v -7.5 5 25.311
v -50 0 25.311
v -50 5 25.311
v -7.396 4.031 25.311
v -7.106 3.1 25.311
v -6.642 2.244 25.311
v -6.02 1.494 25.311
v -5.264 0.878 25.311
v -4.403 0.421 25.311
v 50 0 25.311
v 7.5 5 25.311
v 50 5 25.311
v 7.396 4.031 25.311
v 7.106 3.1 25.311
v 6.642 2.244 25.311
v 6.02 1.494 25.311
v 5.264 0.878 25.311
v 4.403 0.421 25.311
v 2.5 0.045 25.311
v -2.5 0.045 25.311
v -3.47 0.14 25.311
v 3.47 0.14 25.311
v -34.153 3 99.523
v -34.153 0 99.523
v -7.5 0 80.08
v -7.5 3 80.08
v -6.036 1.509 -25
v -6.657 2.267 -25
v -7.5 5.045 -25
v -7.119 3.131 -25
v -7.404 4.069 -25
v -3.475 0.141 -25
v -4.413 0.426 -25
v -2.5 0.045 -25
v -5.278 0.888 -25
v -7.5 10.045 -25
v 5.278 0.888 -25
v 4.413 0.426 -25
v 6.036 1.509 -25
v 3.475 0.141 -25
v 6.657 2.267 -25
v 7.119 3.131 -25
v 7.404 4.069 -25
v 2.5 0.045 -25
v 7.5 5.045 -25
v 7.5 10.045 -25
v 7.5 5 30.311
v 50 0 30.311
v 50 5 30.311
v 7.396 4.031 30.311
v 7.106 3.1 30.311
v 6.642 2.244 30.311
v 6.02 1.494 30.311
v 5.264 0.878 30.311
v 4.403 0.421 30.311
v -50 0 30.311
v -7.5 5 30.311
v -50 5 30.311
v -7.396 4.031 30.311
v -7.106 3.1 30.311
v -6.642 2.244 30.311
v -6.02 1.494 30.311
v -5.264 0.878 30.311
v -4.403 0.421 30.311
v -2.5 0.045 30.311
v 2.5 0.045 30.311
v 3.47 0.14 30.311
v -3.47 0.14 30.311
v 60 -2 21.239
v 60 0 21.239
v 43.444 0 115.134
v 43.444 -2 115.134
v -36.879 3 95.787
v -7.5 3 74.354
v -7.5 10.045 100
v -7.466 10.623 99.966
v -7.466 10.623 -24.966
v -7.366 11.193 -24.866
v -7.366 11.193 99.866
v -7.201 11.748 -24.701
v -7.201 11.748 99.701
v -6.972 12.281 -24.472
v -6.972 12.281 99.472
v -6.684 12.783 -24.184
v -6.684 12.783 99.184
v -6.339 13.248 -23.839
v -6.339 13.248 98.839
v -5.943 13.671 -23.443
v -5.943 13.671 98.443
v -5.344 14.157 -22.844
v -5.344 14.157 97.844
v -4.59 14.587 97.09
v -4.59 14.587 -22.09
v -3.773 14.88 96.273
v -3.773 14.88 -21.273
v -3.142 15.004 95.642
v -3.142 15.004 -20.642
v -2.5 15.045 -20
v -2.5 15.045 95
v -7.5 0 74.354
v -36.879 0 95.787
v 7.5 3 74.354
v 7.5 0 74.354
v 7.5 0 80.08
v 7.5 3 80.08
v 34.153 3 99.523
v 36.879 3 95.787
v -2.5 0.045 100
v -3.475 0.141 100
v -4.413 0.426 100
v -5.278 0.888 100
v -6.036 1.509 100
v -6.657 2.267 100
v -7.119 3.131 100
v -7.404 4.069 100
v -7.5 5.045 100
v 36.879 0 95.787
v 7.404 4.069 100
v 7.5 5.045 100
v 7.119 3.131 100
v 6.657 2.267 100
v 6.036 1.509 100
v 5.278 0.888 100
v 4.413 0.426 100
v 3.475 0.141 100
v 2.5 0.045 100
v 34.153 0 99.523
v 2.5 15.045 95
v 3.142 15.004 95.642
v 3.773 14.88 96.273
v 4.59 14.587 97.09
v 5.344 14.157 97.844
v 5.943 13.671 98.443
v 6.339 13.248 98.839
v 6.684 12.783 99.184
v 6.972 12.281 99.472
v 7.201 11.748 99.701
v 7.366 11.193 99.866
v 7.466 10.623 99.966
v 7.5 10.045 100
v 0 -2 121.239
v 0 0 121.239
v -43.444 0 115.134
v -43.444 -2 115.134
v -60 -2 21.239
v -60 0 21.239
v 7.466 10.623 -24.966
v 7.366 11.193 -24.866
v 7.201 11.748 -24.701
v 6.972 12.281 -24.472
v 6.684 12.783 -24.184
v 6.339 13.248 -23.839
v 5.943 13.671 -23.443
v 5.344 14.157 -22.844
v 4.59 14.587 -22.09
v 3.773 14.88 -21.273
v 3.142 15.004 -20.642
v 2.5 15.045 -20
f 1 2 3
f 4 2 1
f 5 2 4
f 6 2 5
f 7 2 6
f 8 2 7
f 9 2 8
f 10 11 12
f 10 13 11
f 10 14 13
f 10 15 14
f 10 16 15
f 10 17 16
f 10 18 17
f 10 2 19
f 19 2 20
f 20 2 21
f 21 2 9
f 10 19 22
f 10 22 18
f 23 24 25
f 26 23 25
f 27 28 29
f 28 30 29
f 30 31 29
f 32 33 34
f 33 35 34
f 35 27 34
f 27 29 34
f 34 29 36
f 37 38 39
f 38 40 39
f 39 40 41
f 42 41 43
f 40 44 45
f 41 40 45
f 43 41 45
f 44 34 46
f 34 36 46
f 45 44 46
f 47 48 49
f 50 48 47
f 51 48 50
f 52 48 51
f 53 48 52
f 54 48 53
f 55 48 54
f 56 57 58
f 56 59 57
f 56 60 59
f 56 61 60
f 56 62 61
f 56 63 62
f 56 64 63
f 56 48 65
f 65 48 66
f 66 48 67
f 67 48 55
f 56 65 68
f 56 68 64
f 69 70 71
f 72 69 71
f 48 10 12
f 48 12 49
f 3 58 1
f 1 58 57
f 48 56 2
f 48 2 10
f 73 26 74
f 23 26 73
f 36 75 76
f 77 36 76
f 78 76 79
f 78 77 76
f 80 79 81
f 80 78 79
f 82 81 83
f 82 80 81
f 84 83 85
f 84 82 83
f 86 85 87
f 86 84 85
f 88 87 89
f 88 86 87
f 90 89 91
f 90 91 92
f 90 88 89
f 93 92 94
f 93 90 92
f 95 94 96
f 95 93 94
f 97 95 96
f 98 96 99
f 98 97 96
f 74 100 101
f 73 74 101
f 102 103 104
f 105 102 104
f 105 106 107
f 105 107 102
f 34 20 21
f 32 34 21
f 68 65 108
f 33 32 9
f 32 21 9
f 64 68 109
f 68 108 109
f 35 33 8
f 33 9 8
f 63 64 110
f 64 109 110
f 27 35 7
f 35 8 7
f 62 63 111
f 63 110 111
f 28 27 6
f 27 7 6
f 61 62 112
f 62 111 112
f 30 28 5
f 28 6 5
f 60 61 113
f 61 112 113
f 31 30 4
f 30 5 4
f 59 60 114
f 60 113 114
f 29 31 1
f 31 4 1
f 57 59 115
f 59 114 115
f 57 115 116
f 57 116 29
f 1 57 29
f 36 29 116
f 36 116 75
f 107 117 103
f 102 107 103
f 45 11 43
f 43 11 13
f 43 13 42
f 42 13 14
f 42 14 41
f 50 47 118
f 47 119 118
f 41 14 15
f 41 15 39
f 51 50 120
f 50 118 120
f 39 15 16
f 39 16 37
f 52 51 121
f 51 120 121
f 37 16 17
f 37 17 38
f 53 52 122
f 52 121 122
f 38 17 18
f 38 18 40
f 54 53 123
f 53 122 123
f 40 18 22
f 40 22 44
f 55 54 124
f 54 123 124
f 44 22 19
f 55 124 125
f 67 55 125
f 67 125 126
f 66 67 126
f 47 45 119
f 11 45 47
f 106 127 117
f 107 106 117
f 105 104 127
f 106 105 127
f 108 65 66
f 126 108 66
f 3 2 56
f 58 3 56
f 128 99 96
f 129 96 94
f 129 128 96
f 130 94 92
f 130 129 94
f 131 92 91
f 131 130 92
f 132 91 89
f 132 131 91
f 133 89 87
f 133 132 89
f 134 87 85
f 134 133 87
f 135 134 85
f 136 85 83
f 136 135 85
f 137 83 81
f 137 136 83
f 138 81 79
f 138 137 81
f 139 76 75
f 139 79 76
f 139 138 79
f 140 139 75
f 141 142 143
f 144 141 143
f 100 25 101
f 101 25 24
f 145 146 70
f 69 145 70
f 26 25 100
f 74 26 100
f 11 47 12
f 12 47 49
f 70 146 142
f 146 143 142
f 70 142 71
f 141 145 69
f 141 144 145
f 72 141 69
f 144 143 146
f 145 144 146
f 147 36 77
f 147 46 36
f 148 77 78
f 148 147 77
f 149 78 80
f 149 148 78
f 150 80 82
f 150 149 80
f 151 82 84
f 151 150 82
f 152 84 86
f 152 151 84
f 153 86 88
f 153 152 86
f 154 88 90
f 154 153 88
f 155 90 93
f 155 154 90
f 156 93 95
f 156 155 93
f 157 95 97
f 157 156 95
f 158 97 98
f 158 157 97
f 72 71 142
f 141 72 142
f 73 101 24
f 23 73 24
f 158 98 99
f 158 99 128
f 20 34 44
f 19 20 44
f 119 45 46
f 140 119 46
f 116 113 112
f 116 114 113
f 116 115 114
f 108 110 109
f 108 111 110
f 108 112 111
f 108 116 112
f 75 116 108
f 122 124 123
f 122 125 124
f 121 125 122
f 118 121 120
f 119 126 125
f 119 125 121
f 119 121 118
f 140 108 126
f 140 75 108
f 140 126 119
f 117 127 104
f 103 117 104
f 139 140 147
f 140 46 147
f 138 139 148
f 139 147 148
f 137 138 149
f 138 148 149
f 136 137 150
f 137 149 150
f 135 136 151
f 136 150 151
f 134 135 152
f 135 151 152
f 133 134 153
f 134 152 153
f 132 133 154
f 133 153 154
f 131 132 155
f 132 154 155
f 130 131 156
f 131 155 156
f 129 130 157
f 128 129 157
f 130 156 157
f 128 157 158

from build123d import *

# Parameters (mm, degrees)
F0_W     = 15
F0_H     = 15
F1_DEPTH = 25
F2_DEPTH = 100
F4_DEPTH = 2
F5_W     = 50
F5_H     = 5
F6_DEPTH = 5
F9_DEPTH = 3
F10_R    = 5


with BuildPart() as f1:
    # F0 (on Top) → F1 (new body)
    with BuildSketch(Plane.XY):
        with Locations((0, 7.5449103606)):
            Rectangle(F0_W, F0_H)
    extrude(amount=-F1_DEPTH)

    # F2 (add): a face of the model
    f2_faces = [f1.faces().sort_by_distance(p)[0] for p in [
        (0, 7.5449103606, 0),
    ]]
    extrude(f2_faces, amount=F2_DEPTH)


with BuildPart() as f4:
    # F3 (on Front) → F4 (new body)
    with BuildSketch(Plane.XZ):
        Polygon((-60, 21.2392159319), (0, 21.2392159319), (0, 121.2392159319), (-43.4438911228, 115.1335752108), align=None)
        Polygon((0, 21.2392159319), (60, 21.2392159319), (43.4438911228, 115.1335752108), (0, 121.2392159319), align=None)
    extrude(amount=F4_DEPTH)


with BuildPart() as f6:
    # F5 (on Front) → F6 (new body)
    with BuildSketch(Plane.XZ):
        with Locations((-25, 27.8107548699)):
            Rectangle(F5_W, F5_H)
        with Locations((25, 27.8107548699)):
            Rectangle(F5_W, F5_H)
    extrude(amount=-F6_DEPTH)


with BuildPart() as f1_1:
    add(f1.part)

    # F7: union F6
    add(f6.part)

    # F10
    f10_edges = [f1_1.edges().sort_by_distance(p)[0] for p in [
        (7.5, 15.04491, 37.5),
        (7.5, 0.04491, 0.155377),
        (0, 15.04491, -25),
        (-7.5, 15.04491, 37.5),
        (0, 15.04491, 100),
        (-7.5, 0.04491, 0.155377),
    ]]
    fillet(f10_edges, radius=F10_R)


with BuildPart() as f9:
    # F8 (on face) → F9 (new body)
    with BuildSketch(Plane(origin=(0, 0, 0), x_dir=(-1, 0, 0), z_dir=(0, 1, 0))):
        Polygon((-7.5, 80.0798447545), (-34.1528759696, 99.5233391426), (-36.8789015881, 95.7865405379), (-7.5, 74.3543878198), align=None)
    extrude(amount=F9_DEPTH)


with BuildPart() as f9b:
    # F8 (on face) → F9, piece 2 (new body)
    with BuildSketch(Plane(origin=(0, 0, 0), x_dir=(-1, 0, 0), z_dir=(0, 1, 0))):
        Polygon((7.5, 80.0798447545), (7.5, 74.3543878198), (36.8789015881, 95.7865405379), (34.1528759696, 99.5233391426), align=None)
    extrude(amount=F9_DEPTH)


solid = Compound([f4.part, f1_1.part, f9.part, f9b.part])
